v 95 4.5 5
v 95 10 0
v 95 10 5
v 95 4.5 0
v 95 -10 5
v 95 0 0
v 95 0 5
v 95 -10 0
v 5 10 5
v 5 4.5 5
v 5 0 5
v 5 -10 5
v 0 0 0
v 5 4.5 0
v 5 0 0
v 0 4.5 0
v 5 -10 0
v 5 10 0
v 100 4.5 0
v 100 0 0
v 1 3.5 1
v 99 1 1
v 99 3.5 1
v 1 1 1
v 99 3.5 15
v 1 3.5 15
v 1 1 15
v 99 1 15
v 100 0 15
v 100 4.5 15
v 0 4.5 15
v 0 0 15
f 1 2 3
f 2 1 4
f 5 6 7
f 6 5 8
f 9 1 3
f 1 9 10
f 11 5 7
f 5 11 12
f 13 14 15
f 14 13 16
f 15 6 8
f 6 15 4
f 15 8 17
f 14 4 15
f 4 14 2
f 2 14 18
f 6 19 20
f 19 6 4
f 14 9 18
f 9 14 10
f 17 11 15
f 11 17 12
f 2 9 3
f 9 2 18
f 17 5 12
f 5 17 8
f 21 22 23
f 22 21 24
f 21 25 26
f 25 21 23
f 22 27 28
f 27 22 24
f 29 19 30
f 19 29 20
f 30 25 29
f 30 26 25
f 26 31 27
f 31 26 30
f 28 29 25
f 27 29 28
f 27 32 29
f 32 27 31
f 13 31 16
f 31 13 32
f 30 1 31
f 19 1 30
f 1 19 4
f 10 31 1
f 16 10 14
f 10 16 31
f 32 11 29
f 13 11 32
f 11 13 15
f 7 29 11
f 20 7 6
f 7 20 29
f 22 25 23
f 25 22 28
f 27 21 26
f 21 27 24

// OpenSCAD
shell_thickness = 1;

plexiglass_thickness = 2.5;

side_bar_length = 100;
side_bar_width = plexiglass_thickness + shell_thickness * 2;
side_bar_height = 15;

plexiglass_length = side_bar_length - shell_thickness * 2;
plexiglass_height = 220;
module plexi_mount(){
 difference(){
translate([5,-10,0]) cube([side_bar_length - 10, 20,5]);
    translate([shell_thickness,shell_thickness,shell_thickness])
    #cube([plexiglass_length,plexiglass_thickness,plexiglass_height]);
}

difference(){
    cube([side_bar_length,side_bar_width,side_bar_height]);
    translate([shell_thickness,shell_thickness,shell_thickness])
    #cube([plexiglass_length,plexiglass_thickness,plexiglass_height]);
}
}

//translate([0,-5,0]) 
plexi_mount();

//rotate([0,0,135]) translate([0,0,0]) plexi_mount();
//rotate([0,0,90]) translate([70,70,0]) plexi_mount();
